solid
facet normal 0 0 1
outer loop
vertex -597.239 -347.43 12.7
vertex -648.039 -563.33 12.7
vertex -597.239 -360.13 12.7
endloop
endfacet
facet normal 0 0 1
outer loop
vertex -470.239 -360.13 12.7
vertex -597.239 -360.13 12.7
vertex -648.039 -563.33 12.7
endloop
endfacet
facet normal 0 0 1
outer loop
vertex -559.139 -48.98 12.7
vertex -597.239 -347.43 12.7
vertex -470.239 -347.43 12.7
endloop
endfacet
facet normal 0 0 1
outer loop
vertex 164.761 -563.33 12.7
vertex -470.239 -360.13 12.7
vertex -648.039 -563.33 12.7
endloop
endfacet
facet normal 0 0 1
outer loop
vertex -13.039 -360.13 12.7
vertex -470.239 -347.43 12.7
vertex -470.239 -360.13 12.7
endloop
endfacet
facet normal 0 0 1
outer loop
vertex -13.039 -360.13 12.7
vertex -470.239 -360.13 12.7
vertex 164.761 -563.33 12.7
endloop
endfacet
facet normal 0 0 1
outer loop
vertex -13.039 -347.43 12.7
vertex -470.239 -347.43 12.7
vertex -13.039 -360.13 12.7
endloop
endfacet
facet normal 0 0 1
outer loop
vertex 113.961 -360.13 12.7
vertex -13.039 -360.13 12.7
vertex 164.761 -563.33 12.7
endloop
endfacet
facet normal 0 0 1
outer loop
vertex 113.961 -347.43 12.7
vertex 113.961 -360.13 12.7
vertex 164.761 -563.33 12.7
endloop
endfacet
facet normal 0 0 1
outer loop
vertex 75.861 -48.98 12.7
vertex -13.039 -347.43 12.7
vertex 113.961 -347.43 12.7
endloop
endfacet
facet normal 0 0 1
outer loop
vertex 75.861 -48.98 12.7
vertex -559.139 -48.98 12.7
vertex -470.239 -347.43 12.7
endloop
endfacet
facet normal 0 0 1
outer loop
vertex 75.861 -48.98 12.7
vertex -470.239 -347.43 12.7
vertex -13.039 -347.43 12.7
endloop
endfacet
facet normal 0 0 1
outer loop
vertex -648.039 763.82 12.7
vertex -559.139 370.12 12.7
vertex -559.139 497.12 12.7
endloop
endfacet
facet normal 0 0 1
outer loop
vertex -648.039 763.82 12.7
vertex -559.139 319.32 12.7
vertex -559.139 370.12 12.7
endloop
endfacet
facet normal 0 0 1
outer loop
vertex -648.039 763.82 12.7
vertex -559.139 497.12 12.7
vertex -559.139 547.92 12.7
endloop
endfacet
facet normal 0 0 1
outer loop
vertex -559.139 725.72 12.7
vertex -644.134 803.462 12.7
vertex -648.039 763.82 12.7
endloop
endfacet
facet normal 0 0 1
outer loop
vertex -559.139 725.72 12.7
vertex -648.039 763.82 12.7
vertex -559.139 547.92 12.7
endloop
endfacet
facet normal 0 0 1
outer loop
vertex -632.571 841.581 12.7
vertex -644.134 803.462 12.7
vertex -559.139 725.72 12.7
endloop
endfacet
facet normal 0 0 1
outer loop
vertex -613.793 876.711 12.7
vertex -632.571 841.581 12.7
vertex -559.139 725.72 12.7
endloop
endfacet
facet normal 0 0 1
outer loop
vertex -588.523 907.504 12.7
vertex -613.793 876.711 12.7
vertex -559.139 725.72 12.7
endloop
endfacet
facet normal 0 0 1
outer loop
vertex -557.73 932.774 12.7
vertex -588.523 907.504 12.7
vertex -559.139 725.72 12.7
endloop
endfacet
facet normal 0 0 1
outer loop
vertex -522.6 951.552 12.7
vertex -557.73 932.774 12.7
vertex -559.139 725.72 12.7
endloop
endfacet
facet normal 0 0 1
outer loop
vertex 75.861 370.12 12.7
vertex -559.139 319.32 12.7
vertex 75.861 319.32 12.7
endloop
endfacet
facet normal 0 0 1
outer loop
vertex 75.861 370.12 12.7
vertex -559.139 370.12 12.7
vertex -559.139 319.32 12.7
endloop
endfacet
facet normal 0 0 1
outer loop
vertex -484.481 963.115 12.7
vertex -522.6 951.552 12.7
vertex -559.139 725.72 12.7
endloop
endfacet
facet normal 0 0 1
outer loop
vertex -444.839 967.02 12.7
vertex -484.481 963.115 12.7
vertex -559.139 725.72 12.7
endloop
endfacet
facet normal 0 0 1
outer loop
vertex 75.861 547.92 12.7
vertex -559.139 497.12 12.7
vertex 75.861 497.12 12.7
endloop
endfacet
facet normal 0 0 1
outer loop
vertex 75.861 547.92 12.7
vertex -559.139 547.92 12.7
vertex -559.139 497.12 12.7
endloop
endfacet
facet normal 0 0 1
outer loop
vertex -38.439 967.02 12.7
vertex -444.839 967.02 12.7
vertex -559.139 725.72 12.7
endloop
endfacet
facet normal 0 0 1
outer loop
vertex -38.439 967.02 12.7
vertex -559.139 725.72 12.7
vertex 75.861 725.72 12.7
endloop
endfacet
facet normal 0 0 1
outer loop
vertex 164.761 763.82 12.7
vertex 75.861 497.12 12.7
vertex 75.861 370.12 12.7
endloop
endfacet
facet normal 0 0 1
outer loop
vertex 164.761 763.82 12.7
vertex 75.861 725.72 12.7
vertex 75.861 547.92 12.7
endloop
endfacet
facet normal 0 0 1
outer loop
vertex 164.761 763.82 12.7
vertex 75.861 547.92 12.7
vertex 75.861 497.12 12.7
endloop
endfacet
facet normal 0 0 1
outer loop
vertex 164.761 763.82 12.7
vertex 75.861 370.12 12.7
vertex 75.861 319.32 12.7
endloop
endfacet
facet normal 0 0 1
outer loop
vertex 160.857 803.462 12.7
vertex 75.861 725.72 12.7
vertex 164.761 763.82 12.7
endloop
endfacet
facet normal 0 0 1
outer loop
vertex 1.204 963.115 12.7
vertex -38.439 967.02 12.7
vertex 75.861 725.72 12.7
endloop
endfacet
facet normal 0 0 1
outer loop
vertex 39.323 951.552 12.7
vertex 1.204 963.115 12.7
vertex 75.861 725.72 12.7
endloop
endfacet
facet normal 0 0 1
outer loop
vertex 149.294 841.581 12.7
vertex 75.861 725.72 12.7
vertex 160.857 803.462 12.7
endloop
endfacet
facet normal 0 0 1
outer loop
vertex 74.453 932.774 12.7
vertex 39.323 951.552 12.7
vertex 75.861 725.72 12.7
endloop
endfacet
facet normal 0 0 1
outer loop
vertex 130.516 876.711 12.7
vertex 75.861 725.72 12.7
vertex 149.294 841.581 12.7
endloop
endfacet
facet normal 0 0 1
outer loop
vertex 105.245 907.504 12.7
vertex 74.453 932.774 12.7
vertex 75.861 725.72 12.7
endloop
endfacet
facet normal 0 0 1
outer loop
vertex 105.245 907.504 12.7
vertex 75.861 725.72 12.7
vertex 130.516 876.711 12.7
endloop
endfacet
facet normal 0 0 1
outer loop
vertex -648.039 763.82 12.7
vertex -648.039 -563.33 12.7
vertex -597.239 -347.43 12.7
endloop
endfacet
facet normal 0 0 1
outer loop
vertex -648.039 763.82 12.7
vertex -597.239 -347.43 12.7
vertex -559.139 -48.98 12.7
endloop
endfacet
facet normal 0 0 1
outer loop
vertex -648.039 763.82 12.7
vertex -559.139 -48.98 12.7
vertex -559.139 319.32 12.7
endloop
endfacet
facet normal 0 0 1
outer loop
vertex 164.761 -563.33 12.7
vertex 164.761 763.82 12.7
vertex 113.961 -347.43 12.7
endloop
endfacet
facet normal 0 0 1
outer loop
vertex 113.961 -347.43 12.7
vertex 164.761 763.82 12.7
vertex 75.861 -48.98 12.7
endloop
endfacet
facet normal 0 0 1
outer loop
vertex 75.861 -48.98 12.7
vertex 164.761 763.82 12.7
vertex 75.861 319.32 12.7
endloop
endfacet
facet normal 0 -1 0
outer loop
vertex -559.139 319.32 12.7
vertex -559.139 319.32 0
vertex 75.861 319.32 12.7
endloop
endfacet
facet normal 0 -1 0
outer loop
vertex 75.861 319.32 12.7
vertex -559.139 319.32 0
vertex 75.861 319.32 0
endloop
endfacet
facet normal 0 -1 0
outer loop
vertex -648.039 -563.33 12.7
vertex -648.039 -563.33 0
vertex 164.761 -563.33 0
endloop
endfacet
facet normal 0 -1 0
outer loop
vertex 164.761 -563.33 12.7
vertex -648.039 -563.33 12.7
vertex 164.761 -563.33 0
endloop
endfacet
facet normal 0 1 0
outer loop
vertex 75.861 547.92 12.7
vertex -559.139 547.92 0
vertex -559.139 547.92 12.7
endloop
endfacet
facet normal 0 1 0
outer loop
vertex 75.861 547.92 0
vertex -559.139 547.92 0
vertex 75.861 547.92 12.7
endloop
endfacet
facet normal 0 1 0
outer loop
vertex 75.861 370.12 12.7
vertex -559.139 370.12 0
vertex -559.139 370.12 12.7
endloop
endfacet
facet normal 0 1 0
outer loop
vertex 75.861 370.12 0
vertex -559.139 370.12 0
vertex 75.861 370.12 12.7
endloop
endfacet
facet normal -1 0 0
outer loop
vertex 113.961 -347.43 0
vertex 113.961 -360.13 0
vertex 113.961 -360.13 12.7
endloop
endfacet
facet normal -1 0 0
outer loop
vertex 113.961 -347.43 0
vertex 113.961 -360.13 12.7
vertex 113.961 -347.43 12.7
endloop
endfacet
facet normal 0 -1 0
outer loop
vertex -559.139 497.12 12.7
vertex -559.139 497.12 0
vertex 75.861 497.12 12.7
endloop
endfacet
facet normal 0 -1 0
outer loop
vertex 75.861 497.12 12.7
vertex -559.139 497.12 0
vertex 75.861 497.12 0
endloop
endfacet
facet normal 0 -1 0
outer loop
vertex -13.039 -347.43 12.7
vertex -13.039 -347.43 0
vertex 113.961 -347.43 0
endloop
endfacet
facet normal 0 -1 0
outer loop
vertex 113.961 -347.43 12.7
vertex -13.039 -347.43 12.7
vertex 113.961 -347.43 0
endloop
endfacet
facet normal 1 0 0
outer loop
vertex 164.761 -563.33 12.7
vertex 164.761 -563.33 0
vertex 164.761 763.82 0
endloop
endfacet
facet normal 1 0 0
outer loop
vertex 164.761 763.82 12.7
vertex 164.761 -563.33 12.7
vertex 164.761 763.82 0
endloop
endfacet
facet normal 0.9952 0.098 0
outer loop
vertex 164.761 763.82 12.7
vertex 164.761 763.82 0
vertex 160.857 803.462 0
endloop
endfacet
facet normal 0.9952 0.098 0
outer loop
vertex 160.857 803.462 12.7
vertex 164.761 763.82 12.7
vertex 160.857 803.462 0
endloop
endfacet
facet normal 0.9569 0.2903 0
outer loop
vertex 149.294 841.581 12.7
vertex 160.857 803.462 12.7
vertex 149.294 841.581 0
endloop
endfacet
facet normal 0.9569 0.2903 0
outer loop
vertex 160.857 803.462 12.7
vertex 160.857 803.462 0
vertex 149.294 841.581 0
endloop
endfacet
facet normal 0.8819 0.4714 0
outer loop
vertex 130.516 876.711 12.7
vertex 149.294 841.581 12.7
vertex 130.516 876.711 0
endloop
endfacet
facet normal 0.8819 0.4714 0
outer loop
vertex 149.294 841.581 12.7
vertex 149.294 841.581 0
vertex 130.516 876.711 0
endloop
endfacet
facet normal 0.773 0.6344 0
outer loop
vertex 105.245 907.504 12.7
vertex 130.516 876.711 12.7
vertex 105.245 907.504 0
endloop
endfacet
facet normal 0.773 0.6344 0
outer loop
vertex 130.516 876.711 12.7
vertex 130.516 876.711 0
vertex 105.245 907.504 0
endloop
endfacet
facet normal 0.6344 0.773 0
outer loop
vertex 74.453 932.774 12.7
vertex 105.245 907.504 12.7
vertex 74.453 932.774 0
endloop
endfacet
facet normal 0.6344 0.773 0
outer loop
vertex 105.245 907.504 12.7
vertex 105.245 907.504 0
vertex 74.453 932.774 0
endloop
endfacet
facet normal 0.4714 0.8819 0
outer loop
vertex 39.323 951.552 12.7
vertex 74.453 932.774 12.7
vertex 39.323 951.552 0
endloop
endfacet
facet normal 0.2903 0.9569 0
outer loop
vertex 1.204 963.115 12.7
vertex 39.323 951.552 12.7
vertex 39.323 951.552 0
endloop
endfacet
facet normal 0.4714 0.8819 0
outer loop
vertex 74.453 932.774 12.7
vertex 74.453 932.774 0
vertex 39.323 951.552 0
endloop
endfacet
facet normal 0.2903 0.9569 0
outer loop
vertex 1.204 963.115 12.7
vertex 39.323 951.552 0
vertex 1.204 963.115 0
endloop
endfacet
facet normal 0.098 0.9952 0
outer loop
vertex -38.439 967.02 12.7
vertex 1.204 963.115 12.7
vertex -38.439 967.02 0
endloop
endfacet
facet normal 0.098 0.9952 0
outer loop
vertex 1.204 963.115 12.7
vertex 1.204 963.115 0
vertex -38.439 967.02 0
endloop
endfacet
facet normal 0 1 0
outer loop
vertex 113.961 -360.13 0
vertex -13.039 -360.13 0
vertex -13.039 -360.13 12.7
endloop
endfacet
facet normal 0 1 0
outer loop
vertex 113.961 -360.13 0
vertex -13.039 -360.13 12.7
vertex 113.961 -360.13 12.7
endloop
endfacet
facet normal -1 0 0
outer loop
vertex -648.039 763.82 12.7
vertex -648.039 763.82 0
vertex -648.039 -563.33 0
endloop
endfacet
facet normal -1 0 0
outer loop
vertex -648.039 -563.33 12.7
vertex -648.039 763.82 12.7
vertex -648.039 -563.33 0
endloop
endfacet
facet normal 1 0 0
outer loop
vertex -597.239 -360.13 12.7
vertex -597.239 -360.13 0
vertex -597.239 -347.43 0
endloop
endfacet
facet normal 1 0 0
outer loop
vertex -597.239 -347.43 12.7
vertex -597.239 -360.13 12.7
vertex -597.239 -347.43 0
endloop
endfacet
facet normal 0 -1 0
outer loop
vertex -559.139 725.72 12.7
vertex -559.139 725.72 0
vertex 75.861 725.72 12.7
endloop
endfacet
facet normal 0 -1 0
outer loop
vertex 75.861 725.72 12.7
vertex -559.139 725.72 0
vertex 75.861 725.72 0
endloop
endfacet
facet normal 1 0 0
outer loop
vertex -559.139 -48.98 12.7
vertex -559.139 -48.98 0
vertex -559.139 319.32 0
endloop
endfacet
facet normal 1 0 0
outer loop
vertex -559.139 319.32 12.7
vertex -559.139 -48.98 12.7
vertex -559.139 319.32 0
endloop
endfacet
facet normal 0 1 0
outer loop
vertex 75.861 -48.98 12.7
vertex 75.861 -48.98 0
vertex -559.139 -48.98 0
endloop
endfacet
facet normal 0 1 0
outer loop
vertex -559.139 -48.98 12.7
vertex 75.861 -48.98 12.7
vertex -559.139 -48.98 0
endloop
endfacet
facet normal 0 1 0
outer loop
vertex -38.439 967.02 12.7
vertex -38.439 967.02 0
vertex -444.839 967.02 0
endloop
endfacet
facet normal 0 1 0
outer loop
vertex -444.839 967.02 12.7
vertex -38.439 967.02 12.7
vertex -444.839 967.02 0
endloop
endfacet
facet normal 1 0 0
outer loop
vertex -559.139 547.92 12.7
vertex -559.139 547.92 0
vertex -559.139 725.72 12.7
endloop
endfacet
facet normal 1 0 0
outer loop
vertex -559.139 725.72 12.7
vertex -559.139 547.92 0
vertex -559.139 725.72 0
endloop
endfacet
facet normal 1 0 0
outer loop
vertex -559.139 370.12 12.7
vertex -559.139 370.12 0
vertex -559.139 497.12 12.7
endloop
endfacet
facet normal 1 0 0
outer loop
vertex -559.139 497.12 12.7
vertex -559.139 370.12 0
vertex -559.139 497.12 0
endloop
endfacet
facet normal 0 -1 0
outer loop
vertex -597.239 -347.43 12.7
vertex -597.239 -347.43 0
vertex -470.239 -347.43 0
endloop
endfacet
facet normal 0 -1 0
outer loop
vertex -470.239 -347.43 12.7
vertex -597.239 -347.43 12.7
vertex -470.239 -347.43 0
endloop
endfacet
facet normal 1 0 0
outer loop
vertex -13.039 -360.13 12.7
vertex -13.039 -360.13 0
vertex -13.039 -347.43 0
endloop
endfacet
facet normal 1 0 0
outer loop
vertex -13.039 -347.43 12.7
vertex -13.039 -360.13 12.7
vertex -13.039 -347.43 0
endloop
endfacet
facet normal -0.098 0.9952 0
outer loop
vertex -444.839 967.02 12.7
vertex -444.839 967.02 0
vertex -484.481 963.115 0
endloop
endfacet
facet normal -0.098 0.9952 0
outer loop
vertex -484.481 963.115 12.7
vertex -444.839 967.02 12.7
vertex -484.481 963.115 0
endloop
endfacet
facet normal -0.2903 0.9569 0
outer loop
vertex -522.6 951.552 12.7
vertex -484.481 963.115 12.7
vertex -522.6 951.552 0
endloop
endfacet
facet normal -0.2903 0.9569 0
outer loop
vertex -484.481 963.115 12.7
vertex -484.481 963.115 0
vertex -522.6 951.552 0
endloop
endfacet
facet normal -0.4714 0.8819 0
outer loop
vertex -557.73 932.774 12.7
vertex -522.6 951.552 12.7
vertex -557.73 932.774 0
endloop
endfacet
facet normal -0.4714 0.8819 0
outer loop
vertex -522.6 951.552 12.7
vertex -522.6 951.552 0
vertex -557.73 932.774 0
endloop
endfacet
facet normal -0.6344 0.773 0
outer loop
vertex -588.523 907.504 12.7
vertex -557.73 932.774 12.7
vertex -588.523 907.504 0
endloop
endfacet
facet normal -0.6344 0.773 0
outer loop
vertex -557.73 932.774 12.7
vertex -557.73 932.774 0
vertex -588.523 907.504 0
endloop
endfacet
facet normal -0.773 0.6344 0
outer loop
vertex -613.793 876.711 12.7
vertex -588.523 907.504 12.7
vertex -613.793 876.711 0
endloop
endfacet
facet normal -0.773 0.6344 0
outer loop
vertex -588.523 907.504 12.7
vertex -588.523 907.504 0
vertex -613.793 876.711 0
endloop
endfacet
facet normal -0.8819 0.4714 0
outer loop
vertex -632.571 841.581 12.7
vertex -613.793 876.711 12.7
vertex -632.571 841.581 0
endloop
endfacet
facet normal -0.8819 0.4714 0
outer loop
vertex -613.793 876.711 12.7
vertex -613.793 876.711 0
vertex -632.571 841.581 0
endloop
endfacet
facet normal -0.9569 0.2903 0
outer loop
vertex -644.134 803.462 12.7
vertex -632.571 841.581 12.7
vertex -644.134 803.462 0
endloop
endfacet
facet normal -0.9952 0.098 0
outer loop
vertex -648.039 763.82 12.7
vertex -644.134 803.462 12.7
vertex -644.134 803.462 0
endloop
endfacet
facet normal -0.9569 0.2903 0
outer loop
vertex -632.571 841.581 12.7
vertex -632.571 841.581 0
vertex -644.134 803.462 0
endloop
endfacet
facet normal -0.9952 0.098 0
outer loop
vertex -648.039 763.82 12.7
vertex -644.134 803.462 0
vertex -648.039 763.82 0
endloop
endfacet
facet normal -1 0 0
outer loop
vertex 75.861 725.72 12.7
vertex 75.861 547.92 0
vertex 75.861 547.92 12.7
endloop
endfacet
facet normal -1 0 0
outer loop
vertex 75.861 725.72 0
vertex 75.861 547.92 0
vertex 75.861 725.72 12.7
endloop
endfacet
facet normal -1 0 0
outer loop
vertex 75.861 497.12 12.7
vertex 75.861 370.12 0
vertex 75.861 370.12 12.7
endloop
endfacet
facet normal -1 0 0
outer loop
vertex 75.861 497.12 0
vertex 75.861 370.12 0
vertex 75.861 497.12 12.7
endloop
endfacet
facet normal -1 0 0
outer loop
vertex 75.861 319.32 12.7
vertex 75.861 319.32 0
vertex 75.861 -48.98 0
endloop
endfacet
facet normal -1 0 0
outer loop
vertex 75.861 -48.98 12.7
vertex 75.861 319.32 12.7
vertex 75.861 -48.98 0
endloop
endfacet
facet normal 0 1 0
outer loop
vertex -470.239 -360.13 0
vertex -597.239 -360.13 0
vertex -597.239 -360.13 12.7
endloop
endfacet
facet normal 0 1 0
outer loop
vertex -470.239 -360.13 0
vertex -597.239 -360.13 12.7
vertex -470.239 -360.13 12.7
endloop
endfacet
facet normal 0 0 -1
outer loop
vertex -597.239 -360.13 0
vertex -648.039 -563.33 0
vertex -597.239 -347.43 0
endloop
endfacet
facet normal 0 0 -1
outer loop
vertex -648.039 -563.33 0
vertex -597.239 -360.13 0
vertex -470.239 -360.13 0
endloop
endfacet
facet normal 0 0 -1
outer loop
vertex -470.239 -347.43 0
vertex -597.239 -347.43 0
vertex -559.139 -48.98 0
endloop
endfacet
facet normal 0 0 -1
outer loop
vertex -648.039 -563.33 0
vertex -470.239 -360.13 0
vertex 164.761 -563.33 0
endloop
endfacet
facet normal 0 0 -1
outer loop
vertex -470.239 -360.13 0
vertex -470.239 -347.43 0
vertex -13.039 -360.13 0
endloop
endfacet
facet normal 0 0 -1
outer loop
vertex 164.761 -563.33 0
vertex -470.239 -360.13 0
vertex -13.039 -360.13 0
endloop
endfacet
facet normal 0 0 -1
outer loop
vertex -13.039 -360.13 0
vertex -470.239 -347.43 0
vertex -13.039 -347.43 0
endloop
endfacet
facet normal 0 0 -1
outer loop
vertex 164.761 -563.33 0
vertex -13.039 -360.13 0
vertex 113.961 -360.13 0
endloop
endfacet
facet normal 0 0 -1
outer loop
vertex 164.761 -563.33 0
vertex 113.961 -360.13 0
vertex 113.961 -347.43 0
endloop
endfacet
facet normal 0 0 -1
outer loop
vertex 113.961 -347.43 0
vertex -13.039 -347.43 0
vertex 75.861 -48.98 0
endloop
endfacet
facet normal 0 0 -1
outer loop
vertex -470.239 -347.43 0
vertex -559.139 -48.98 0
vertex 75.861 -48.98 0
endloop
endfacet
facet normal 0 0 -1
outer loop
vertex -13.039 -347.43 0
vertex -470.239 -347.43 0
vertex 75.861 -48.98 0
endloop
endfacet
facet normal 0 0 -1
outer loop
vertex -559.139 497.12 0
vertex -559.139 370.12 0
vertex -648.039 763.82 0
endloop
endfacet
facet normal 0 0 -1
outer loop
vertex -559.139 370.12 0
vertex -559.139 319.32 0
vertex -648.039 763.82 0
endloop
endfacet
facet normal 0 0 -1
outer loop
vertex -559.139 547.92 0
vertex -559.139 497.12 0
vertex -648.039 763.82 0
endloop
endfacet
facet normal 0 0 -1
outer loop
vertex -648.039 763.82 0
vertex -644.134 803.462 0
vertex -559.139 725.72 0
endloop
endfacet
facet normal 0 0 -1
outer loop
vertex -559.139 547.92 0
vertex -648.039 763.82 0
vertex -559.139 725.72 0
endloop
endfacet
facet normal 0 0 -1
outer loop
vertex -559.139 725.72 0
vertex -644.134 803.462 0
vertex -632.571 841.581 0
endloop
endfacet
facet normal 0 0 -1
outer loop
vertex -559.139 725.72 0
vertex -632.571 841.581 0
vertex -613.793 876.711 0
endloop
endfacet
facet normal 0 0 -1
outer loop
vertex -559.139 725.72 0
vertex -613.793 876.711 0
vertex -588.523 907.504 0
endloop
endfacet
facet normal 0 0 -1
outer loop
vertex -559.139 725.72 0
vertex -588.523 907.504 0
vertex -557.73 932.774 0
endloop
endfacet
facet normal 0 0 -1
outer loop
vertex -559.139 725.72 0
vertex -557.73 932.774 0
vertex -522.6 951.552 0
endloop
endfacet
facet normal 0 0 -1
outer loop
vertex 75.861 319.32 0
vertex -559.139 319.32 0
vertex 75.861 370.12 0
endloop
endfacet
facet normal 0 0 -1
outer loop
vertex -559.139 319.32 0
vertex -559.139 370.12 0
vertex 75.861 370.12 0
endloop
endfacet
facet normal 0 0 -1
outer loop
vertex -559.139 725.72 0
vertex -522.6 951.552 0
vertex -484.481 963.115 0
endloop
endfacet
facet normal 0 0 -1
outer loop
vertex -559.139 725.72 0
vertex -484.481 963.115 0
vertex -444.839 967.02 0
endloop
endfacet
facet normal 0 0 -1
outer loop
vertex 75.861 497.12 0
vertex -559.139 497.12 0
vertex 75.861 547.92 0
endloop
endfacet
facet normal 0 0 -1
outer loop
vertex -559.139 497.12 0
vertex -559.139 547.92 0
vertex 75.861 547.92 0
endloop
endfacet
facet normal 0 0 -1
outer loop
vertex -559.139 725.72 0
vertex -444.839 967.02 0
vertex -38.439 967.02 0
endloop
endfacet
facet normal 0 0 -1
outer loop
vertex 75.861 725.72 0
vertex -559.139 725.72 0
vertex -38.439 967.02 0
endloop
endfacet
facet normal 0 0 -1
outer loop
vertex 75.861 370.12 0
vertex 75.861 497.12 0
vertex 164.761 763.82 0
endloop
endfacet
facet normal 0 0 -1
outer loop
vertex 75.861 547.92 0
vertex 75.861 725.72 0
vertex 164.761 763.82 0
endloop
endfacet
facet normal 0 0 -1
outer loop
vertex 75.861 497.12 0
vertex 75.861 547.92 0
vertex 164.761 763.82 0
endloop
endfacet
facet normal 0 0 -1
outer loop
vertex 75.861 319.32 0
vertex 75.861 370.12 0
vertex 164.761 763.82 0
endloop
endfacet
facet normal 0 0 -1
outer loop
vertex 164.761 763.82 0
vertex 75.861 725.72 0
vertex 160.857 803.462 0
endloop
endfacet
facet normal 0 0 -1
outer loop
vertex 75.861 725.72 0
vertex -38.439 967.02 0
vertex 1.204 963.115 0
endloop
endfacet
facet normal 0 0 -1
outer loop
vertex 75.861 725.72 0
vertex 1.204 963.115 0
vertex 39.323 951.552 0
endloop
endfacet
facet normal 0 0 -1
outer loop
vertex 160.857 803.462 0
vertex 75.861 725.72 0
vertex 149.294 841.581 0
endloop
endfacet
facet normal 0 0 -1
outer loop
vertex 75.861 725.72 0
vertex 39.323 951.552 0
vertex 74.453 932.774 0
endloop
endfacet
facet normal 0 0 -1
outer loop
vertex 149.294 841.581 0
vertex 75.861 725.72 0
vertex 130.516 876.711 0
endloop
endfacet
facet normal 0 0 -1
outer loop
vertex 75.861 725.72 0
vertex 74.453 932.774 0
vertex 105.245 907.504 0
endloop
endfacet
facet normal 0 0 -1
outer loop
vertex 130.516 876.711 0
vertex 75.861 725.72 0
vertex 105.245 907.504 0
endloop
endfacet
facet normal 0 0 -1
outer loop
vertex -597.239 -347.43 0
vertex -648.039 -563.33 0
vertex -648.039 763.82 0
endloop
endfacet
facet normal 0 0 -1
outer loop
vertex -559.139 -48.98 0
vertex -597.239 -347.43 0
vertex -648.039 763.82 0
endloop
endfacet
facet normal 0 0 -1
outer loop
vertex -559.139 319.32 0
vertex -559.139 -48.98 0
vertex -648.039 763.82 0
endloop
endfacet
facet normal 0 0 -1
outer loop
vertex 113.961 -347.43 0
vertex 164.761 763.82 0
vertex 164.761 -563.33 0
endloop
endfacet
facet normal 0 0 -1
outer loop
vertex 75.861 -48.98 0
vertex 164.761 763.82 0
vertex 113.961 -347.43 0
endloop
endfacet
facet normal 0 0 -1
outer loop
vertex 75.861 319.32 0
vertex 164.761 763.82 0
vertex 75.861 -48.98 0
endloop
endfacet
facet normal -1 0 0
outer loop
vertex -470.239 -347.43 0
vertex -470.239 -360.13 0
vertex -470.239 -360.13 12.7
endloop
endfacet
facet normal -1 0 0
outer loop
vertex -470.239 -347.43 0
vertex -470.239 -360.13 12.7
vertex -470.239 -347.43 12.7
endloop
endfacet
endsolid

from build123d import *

# Parameters (mm, degrees)
F0_W     = 127
F0_H     = 12.7
F0_W_2   = 635
F0_H_2   = 126.9999911487
F0_H_3   = 177.8000088513
F1_DEPTH = 12.7


# Not quite as in the source:
# - a feature names something its author has since deleted; it is built from what else it names


with BuildPart() as f1:
    # F0 (on Top) → F1 (new body)
    with BuildSketch(Plane.XY):
        with BuildLine():
            ThreePointArc((-444.8386187891, 967.019580251), (-588.5227167262, 907.5036781881), (-648.0386187891, 763.819580251))
            Line((-648.0386187891, 763.819580251), (-648.0386187891, -556.980419749))
            Line((-648.0386187891, -556.980419749), (-648.0386187891, -563.330419749))
            Line((-648.0386187891, -563.330419749), (164.7613812109, -563.330419749))
            Line((164.7613812109, -563.330419749), (164.7613812109, -556.980419749))
            Line((164.7613812109, -556.980419749), (164.7613812109, 763.819580251))
            ThreePointArc((164.7613812109, 763.819580251), (105.245479148, 907.5036781881), (-38.4386187891, 967.019580251))
            Line((-38.4386187891, 967.019580251), (-444.8386187891, 967.019580251))
        make_face()
        with Locations((-533.7386187891, -353.780419749)):
            Rectangle(F0_W, F0_H, mode=Mode.SUBTRACT)
        with Locations((50.4613812109, -353.780419749)):
            Rectangle(F0_W, F0_H, mode=Mode.SUBTRACT)
        Polygon((75.8613812109, -48.980419749), (-559.1386187891, -48.980419749), (-559.1386187891, 90.719580251), (-559.1386187891, 141.519580251), (-559.1386187891, 319.319580251), (75.8613812109, 319.319580251), (75.8613812109, 141.519580251), (75.8613812109, 90.719580251), align=None, mode=Mode.SUBTRACT)
        with Locations((-241.6386187891, 433.6195758253)):
            Rectangle(F0_W_2, F0_H_2, mode=Mode.SUBTRACT)
        with Locations((-241.6386187891, 636.8195758253)):
            Rectangle(F0_W_2, F0_H_3, mode=Mode.SUBTRACT)
    extrude(amount=F1_DEPTH)


solid = f1.part
